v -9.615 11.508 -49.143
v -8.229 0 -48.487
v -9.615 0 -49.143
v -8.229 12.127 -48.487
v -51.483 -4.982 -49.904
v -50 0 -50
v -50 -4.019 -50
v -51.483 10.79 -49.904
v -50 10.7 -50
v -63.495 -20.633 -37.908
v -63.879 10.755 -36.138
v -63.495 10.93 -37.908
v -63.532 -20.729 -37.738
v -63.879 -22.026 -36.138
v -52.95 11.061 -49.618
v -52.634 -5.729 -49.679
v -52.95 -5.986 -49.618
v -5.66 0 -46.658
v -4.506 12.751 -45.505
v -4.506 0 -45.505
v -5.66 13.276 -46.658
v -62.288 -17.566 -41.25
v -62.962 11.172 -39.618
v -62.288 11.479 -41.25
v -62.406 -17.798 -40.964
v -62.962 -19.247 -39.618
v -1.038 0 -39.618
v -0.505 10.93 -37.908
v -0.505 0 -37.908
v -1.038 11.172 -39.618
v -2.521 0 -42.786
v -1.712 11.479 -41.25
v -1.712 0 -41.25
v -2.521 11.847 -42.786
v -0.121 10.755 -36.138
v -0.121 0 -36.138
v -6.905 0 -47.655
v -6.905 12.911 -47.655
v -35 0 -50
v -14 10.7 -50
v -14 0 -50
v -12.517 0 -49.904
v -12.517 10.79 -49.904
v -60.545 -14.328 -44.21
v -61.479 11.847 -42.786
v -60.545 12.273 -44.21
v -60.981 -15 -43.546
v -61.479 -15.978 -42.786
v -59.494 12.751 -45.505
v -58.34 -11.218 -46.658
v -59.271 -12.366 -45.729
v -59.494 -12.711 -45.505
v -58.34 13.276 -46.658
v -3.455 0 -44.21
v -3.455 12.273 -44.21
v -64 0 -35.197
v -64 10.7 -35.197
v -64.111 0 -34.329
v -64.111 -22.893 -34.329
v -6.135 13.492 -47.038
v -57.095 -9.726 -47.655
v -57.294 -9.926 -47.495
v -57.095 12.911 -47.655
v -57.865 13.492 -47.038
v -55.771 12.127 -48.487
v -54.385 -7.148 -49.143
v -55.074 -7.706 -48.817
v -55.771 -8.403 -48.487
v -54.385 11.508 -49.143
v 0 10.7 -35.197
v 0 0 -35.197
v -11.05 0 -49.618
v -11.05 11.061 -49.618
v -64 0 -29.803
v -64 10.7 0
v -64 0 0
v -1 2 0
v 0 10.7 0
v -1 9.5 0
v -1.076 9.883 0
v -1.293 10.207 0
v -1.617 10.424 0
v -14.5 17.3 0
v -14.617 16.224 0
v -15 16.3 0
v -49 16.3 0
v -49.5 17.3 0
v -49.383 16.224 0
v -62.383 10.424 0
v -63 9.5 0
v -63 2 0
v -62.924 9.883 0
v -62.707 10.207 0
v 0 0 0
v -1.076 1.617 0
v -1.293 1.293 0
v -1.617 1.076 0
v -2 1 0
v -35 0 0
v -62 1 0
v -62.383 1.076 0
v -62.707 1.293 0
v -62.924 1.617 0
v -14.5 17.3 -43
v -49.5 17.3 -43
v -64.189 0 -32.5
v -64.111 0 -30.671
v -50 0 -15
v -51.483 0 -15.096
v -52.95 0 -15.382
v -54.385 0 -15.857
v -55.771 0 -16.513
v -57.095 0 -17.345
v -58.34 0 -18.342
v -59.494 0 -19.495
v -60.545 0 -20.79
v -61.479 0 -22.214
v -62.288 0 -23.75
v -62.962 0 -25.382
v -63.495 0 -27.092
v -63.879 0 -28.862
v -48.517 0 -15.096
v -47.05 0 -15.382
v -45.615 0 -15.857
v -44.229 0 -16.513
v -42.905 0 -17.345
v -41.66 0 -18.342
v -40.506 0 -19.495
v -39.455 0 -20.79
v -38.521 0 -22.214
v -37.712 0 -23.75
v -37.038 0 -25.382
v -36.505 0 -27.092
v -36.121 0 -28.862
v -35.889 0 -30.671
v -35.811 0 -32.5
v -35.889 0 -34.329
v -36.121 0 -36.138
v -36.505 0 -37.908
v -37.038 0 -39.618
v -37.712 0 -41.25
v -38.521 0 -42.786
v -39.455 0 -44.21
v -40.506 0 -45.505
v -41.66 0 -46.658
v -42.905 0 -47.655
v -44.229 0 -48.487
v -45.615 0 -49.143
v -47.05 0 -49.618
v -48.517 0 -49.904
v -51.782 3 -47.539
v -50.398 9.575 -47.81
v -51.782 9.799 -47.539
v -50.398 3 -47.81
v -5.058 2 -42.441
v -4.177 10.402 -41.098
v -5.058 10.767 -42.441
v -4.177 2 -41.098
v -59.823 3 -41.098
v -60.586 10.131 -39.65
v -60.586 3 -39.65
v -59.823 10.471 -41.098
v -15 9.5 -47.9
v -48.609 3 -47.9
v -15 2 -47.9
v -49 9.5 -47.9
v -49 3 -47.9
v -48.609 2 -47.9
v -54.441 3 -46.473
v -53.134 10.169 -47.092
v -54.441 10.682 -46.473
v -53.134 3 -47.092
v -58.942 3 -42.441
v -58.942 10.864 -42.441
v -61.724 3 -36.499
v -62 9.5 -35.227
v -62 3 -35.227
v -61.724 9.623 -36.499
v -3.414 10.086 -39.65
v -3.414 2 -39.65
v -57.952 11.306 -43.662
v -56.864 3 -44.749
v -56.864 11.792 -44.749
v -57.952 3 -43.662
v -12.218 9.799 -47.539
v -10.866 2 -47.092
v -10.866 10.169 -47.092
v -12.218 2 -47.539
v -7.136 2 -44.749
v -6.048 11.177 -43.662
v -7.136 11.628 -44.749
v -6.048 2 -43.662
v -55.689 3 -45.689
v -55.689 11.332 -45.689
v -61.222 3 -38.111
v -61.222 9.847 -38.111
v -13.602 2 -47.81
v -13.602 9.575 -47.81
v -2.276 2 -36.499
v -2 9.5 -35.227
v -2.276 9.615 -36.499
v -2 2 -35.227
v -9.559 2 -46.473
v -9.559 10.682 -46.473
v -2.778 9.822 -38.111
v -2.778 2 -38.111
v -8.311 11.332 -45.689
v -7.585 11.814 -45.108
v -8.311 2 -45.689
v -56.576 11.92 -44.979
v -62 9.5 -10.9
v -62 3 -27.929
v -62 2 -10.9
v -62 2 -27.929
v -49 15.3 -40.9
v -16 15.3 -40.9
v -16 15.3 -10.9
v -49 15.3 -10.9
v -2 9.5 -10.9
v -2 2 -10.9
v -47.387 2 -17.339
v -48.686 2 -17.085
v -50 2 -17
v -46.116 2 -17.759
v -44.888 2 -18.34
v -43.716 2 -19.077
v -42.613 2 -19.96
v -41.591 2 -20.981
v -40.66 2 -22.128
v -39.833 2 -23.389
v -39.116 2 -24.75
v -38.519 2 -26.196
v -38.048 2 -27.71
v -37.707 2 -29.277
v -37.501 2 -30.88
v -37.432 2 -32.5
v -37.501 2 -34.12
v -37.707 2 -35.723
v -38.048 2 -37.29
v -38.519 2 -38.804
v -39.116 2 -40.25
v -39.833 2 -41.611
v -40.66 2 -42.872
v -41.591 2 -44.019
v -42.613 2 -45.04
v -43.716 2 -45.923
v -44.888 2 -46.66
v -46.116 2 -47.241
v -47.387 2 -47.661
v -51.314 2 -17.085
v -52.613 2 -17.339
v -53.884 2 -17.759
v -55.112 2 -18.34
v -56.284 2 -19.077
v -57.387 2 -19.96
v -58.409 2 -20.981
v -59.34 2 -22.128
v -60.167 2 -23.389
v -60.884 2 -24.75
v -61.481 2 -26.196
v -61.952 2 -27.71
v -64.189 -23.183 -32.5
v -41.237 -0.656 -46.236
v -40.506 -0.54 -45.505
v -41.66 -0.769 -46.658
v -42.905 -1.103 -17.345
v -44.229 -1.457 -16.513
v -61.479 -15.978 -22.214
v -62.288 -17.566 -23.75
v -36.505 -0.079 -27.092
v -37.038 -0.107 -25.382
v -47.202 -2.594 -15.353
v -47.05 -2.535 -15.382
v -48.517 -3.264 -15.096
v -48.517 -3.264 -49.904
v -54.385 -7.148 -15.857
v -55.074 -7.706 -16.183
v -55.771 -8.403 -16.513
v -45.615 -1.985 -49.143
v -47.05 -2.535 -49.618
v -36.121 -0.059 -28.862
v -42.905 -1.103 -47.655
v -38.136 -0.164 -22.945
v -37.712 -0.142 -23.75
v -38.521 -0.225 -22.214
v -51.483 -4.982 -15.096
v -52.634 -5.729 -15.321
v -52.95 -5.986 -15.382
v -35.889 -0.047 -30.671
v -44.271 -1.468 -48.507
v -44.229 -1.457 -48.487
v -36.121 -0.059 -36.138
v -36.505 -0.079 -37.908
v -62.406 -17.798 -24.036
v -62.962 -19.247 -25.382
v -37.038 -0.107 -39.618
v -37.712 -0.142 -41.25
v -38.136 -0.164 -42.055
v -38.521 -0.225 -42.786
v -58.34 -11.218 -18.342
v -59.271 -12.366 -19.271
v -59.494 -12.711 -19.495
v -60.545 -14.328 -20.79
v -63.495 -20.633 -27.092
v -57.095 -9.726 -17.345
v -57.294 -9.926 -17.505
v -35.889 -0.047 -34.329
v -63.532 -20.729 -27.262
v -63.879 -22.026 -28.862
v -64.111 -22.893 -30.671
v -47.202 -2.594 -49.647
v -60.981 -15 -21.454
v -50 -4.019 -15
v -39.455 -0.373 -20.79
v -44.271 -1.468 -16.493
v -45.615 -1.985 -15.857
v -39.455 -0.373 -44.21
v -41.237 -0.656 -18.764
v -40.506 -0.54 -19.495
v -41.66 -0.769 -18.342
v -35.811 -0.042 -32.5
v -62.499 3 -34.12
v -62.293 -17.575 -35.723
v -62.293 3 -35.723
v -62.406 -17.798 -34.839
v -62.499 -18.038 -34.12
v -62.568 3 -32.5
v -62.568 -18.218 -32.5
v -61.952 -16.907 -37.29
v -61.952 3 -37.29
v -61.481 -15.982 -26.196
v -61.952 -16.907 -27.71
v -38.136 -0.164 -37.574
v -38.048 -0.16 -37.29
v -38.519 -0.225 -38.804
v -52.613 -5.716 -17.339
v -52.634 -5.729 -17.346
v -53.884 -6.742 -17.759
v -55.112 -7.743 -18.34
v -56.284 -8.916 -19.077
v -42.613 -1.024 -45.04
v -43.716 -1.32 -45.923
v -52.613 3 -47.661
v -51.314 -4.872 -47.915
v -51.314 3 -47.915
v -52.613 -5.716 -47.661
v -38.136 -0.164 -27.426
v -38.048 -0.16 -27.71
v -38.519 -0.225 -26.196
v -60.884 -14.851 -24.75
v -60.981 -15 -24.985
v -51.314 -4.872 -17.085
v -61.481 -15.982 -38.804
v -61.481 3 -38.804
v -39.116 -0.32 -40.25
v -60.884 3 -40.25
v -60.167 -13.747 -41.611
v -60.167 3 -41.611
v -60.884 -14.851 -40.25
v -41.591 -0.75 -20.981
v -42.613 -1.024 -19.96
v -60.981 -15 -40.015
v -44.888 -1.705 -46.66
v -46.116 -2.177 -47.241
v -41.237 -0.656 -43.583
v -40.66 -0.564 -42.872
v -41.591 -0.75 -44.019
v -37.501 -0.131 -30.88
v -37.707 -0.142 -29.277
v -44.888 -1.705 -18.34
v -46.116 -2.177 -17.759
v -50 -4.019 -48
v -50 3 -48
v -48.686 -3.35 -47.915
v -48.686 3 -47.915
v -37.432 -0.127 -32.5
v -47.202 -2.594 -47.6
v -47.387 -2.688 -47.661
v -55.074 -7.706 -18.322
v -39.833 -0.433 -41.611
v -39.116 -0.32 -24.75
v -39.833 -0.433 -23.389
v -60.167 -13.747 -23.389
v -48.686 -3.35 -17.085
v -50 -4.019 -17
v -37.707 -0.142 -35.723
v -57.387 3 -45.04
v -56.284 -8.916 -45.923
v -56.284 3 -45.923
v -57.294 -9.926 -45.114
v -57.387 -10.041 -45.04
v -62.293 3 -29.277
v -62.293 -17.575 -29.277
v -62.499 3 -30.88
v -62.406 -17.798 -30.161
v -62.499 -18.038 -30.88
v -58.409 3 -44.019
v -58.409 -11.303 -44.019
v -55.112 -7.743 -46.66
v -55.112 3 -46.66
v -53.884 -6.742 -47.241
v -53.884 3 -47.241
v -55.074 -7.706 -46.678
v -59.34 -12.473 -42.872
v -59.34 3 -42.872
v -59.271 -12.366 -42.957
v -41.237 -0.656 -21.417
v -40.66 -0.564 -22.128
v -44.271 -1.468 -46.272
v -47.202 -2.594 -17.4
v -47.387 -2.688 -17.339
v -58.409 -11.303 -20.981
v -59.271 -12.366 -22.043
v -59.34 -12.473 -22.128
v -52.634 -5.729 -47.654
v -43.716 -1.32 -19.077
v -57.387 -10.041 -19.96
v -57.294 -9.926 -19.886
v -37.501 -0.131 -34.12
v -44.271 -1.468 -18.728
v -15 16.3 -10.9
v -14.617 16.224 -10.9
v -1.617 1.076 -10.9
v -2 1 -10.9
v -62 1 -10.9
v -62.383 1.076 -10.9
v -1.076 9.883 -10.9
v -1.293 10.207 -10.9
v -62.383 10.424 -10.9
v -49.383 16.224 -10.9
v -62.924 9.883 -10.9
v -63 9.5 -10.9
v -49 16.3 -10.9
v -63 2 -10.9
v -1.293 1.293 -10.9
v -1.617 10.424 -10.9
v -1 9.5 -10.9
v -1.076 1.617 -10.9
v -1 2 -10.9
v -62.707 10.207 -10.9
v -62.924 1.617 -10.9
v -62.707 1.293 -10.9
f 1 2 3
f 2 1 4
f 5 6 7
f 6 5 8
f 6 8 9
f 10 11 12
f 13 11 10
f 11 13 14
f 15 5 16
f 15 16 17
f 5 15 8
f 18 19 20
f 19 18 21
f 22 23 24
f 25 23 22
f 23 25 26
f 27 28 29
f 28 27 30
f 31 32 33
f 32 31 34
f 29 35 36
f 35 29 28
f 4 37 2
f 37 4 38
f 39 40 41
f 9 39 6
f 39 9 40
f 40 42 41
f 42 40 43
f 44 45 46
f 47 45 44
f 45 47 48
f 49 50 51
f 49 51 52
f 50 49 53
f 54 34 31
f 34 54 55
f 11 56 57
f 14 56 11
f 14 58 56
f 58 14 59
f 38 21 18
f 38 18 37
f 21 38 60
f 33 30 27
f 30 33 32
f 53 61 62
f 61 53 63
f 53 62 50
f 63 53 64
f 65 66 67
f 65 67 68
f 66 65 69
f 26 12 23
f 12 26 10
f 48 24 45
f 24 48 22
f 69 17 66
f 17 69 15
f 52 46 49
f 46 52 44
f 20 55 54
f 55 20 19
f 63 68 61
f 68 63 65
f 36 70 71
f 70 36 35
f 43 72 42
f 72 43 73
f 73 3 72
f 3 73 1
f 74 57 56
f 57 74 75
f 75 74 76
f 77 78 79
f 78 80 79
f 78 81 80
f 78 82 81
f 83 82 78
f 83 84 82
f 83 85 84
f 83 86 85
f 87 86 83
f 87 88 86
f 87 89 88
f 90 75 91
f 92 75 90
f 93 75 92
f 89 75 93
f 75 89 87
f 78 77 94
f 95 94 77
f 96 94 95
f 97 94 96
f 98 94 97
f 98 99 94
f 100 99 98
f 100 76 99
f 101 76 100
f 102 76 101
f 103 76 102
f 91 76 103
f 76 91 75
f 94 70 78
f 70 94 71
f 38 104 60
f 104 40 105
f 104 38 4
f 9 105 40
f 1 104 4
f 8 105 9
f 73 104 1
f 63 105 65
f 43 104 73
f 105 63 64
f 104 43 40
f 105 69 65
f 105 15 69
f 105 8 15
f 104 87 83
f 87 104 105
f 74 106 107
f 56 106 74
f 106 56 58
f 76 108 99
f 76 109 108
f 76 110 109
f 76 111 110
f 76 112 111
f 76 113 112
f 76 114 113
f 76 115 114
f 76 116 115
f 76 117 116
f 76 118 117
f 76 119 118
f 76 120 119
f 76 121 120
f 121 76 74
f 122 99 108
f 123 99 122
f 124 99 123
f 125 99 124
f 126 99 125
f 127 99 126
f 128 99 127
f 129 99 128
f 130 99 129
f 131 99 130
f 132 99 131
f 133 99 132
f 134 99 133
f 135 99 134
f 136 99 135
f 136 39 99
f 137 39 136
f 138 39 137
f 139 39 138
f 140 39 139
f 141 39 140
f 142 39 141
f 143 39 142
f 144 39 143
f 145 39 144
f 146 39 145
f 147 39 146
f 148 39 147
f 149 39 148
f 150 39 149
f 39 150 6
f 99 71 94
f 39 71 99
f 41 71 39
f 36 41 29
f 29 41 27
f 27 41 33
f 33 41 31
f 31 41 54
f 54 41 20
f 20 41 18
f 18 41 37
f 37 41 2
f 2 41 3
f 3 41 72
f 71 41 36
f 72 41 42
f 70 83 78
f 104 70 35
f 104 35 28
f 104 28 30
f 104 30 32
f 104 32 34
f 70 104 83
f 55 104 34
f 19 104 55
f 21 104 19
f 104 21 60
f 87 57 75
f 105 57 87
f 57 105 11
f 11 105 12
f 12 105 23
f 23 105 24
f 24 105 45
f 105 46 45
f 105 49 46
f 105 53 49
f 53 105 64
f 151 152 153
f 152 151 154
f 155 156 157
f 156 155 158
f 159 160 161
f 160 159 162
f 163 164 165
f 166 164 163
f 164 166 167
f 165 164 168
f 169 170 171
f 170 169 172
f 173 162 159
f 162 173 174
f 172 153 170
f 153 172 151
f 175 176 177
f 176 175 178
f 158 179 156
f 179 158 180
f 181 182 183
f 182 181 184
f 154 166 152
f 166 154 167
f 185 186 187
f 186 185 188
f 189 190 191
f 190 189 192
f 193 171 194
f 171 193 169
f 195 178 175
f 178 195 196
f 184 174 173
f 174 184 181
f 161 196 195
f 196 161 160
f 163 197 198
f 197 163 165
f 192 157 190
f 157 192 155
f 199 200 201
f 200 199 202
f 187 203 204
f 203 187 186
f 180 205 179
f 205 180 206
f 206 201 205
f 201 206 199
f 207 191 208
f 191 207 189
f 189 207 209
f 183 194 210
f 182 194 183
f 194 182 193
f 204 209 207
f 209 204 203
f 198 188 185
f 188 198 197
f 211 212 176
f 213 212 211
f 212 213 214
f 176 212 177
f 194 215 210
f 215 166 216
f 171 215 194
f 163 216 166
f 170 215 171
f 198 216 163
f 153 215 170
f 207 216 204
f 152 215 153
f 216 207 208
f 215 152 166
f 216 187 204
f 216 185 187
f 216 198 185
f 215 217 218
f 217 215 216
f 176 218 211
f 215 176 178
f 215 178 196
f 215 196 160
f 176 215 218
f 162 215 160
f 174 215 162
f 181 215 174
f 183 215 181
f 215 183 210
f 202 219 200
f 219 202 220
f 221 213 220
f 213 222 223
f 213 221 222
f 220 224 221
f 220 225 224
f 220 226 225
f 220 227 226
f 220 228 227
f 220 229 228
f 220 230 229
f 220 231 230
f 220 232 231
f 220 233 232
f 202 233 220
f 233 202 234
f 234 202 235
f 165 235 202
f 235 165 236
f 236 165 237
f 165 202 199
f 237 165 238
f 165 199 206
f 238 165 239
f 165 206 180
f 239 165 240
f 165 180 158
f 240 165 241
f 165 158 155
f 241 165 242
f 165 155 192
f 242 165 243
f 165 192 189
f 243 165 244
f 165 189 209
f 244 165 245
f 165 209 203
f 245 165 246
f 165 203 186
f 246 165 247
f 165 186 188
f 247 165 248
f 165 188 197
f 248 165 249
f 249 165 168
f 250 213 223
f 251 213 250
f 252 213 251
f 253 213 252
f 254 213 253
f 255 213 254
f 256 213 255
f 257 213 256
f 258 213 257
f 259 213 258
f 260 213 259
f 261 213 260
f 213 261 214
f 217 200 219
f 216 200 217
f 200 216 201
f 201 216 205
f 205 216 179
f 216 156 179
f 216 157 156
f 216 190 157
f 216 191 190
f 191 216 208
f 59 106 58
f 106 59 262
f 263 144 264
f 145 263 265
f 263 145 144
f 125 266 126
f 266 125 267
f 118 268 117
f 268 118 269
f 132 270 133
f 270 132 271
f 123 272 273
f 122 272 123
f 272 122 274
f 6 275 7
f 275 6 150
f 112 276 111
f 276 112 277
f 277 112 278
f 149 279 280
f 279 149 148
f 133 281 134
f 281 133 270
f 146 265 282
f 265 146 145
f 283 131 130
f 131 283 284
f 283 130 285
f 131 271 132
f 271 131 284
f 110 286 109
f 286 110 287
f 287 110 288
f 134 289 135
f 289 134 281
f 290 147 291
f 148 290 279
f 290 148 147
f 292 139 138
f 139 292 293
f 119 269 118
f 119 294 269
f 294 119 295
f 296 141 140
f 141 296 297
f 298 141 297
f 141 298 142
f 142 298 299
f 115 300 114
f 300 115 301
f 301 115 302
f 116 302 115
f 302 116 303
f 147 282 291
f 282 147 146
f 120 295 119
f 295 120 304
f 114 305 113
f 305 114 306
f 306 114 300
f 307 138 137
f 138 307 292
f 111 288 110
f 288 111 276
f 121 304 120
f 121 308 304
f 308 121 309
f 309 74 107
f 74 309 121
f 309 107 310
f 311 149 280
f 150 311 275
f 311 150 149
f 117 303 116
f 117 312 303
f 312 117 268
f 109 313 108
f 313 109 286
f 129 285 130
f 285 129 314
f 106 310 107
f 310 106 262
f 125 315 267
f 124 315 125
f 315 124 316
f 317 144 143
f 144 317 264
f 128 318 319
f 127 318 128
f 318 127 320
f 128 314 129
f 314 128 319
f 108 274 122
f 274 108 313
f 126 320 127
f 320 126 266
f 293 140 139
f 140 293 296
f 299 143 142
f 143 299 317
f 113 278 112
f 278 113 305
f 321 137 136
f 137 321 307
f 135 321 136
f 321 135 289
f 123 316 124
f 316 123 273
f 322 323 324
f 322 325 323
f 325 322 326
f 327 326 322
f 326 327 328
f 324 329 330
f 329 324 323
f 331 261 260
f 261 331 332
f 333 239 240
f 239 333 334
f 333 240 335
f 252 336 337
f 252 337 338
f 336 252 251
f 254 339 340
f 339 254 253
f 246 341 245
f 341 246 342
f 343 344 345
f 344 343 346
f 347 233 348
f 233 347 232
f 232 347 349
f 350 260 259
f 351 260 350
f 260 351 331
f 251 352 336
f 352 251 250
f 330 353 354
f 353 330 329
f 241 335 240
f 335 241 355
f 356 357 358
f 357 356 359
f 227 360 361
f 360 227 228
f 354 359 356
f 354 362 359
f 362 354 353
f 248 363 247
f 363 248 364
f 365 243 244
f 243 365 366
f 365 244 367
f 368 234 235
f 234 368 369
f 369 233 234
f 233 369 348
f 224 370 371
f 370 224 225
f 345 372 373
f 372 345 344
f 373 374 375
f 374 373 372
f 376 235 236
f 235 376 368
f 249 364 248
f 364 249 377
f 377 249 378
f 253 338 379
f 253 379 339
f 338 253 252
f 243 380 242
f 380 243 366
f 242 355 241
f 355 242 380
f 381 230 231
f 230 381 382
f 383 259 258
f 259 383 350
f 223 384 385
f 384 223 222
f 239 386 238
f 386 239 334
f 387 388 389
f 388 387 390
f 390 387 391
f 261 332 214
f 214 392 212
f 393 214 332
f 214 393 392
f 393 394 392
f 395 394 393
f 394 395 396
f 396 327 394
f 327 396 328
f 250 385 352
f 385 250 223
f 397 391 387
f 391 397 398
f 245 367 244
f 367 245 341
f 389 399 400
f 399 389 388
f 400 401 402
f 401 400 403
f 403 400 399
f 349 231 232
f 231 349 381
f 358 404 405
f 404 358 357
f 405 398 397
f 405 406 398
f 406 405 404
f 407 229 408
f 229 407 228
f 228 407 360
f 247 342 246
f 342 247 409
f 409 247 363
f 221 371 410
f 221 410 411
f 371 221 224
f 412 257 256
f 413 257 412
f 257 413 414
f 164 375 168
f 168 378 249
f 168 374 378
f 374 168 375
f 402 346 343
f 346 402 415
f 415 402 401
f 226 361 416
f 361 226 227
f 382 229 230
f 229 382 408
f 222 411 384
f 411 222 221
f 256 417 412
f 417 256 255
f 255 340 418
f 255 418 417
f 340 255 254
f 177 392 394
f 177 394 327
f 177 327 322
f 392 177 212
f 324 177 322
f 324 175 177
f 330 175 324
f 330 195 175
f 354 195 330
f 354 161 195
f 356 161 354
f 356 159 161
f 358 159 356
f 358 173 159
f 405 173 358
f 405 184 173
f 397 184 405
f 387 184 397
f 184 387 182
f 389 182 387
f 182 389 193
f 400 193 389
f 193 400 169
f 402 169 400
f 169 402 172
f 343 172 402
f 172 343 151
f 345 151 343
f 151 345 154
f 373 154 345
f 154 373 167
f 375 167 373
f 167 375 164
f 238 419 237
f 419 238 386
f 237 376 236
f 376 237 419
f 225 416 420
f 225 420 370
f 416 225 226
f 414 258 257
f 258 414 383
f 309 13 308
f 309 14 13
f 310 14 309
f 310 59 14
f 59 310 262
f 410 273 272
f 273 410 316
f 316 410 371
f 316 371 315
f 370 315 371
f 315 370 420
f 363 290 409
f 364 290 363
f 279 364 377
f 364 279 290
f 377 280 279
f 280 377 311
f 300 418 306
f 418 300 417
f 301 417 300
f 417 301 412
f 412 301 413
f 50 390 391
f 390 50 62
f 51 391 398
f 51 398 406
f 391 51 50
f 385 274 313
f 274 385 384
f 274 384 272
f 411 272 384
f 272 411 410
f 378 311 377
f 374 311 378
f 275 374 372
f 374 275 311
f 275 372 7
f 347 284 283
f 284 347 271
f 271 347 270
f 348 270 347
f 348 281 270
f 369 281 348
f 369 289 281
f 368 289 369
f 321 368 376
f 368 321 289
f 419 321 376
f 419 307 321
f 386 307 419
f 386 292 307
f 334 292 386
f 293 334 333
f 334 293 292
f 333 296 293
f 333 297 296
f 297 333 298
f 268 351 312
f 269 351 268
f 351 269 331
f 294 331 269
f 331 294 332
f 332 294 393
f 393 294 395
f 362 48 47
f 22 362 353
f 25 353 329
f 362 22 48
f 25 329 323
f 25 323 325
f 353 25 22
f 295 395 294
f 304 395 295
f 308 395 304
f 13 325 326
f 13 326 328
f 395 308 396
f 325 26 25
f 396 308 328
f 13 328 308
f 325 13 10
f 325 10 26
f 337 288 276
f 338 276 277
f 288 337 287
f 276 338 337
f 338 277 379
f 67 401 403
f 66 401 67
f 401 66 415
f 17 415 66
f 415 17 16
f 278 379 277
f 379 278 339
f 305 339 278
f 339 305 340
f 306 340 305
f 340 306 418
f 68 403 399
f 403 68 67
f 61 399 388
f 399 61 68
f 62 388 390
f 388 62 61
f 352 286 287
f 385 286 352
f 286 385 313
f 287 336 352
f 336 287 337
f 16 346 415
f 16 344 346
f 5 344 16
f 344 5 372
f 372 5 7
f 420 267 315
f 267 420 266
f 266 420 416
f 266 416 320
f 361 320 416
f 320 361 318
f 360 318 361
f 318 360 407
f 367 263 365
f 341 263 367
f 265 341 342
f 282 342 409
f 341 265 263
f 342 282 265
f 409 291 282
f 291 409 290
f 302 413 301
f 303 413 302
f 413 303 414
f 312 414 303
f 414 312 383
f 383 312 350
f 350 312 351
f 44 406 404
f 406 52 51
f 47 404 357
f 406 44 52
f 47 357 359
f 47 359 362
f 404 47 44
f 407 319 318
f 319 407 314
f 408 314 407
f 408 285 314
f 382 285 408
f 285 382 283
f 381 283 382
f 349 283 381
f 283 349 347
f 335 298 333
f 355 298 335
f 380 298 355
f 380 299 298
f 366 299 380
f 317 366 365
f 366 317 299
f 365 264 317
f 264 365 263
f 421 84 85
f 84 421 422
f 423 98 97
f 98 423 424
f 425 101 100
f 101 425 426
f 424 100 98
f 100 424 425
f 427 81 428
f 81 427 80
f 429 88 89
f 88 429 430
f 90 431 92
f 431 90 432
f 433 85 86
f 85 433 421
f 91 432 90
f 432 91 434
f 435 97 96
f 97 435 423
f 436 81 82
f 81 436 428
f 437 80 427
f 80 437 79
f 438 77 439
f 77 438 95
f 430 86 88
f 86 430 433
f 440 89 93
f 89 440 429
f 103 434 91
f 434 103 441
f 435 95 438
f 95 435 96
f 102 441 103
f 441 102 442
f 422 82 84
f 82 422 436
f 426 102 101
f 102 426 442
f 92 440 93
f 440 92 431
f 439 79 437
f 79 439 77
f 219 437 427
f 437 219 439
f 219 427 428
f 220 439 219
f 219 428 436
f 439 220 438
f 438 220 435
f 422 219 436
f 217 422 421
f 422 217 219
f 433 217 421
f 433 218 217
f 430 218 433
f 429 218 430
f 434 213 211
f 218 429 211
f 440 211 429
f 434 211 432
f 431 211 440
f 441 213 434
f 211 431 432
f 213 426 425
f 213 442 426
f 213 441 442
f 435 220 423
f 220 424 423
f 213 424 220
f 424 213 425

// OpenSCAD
$fn=60;

rotate([0,180,0]){
difference() {
union() {
difference() {


	intersection() {
		union() {
			hull(){
translate([
	65-30/2,
	20,
	50-35/2
])
rotate([90,0,0])
scale([6/7.4,1,1])
cylinder(
	r=35/2,
	h=24
);
translate([
	30/2 - 1,
	20,
	50-35/2
])
rotate([90,0,0])
scale([6/7.4,1,1])
cylinder(
	r=35/2,
	h=24
);
			}
translate([0,-10,0])
cube([
	64,
	30,
	50-35/2
]);
		}

		hull(){
cube([64, 8.5+1.1+1.1, 50]);
translate([(64-35)/2,0,0])
cube([35, 17.3, 43]);
		}
	}



translate([0,0,-.1])
	intersection() {
		union() {
			hull(){
translate([
	63-28/2,
	20,
	48-33/2
])
rotate([90,0,0])
scale([6/7.4,1,1])
cylinder(
	r=33/2,
	h=24
);
translate([
	28/2 - 1 +2,
	20,
	48-33/2
])
rotate([90,0,0])
scale([6/7.4,1,1])
cylinder(
	r=33/2,
	h=24
);
			}
translate([0,-10,0])
cube([
	62,
	28,
	48-33/2
]);



		}

translate([2,2,0])
		hull(){
cube([60, 7.5, 48]);
translate([(61-33)/2,0,0])
cube([33, 17.3-4, 41]);
		}


	}
}
translate([
	65-30/2,
	0,
	50-35/2
])
rotate([90,0,0])
scale([6/7.4,1,1])
cylinder(
	r=35/2,
	h=24
);

}


translate([
	64-28/2,
	3,
	49-33/2
])
rotate([90,0,0])
scale([6/7.4,1,1])
cylinder(
	r=31/2,
	h=240
);
translate([
	35,
	-30,
	0
])
cylinder(
	r=30,
	h=100
);

minkowski() {
cylinder(r=1,h=1,$fn=16);
translate([2,2,-.1])
		hull(){
cube([60, 7.5, 10]);
translate([(60-34)/2,0,0])
cube([34, 17.3-4, 10]);
}

}}
}
